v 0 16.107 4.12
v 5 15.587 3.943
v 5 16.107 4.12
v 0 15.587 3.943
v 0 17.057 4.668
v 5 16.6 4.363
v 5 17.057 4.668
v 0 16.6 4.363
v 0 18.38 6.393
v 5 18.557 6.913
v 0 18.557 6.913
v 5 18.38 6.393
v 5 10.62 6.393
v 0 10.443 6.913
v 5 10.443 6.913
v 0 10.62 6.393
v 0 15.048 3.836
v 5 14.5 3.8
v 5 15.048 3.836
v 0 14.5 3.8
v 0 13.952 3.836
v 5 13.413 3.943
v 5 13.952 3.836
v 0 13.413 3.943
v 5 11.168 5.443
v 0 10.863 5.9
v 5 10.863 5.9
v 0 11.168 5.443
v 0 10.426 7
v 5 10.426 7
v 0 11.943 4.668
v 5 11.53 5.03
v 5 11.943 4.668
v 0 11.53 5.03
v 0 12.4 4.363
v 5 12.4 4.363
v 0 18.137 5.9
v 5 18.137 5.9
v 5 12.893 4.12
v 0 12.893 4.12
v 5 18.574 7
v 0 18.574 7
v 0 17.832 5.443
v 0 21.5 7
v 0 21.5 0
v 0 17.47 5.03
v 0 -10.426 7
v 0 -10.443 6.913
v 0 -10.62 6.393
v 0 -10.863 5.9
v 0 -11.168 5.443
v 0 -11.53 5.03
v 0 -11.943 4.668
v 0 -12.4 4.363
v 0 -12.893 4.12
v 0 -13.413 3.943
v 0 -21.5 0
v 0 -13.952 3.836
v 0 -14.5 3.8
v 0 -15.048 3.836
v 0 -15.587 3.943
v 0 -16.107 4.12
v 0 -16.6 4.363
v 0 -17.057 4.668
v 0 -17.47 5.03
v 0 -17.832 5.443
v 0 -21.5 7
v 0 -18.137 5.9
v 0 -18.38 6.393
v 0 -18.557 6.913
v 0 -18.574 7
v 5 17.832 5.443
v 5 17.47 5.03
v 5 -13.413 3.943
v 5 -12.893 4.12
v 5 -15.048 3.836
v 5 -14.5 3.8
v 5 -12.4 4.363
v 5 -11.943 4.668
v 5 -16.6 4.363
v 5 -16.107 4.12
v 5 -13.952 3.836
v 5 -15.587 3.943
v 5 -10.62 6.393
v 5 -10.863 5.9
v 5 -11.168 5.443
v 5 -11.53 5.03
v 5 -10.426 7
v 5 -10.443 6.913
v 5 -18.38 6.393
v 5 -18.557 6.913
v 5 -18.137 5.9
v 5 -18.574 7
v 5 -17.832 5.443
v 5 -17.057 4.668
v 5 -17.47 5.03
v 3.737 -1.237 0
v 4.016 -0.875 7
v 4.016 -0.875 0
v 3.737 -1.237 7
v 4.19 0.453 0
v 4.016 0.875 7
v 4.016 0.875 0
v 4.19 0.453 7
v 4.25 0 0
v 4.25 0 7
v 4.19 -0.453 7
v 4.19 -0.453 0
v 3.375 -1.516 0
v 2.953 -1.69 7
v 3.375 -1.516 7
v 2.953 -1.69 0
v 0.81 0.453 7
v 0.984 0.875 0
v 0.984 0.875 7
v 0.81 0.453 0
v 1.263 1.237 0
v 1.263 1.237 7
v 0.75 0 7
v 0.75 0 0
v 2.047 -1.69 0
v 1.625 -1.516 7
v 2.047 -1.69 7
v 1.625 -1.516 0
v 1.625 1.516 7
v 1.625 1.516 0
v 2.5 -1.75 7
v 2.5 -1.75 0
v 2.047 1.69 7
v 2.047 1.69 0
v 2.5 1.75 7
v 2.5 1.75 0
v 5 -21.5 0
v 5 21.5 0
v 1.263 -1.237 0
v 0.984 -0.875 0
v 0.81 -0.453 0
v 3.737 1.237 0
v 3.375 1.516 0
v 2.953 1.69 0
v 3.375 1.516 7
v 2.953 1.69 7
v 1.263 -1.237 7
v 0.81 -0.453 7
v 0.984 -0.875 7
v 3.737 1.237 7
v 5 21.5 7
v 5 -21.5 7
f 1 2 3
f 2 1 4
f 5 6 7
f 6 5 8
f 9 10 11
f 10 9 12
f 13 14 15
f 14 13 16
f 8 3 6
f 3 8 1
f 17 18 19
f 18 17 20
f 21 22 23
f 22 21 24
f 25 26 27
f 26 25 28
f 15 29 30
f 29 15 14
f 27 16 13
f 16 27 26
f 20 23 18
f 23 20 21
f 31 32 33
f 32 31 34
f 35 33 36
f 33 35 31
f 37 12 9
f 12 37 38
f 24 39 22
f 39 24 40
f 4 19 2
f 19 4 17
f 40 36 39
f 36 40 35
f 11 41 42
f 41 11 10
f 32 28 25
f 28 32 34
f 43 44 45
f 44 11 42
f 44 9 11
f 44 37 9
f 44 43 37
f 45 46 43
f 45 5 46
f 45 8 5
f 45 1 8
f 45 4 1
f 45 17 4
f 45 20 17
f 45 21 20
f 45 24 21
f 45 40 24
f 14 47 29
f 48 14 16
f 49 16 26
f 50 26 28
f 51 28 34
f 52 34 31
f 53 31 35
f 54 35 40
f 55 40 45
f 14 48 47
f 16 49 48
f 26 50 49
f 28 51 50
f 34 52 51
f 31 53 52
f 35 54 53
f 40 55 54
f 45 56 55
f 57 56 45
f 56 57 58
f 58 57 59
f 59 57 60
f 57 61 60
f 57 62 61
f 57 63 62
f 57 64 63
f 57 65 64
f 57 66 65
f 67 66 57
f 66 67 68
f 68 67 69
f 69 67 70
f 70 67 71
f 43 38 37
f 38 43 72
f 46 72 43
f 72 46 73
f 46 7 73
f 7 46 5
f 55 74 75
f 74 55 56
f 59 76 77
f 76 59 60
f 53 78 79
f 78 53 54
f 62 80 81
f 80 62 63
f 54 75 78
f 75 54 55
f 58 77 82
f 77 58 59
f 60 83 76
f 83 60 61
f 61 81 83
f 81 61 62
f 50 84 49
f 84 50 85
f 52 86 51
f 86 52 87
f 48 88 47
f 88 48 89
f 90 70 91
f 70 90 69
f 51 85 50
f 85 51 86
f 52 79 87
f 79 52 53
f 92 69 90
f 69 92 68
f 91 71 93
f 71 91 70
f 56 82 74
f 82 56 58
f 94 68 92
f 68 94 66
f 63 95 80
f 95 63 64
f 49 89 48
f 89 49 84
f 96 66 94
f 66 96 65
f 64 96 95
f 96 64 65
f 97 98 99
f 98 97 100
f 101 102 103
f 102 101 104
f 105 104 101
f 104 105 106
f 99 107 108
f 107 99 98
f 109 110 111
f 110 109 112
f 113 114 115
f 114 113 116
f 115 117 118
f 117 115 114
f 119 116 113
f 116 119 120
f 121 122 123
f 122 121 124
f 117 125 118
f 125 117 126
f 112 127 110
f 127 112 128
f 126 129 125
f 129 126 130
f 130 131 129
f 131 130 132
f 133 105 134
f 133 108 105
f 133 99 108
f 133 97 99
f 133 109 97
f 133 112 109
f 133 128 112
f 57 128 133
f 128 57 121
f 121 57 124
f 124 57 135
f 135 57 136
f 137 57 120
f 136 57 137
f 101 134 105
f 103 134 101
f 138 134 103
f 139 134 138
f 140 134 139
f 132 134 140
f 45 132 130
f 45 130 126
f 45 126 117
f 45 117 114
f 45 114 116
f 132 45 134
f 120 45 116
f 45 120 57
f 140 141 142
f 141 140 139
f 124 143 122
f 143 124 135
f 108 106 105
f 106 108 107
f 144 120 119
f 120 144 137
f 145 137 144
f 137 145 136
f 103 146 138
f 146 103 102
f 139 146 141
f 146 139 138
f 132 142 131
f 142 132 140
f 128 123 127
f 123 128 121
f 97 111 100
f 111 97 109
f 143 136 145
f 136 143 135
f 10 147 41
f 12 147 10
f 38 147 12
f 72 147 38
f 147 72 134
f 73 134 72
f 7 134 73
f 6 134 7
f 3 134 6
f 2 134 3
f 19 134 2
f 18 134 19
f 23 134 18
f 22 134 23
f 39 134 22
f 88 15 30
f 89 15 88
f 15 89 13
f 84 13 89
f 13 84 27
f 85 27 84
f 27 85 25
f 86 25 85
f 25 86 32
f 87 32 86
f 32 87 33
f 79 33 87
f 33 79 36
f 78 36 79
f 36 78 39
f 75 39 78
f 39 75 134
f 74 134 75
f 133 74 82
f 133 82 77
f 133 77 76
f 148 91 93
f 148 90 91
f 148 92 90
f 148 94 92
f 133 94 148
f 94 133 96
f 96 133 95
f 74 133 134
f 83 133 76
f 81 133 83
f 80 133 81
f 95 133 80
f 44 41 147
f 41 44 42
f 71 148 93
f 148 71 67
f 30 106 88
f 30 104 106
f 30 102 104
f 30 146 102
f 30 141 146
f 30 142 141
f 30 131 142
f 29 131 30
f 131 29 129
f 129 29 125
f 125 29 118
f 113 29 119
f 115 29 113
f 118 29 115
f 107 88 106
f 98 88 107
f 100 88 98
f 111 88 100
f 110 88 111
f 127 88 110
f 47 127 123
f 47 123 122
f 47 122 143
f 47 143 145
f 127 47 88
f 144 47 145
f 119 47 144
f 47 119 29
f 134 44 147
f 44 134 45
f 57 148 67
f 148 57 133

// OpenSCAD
difference()
{
    union()
    {
        translate([0,-(29+4*2+3*2)/2,0])
            cube([5,29+4*2+3*2,3+4]);
    }
    union()
    {
        translate([0,29/2,4+4])
            rotate([0,90,0])
                cylinder(d=8.4,h=6,$fn=48);
        
        translate([0,-29/2,4+4])
            rotate([0,90,0])
                cylinder(d=8.4,h=6,$fn=48);
        
        translate([5/2,0,0])
            cylinder(d=3.5,h=10,$fn=24);
    }
}
